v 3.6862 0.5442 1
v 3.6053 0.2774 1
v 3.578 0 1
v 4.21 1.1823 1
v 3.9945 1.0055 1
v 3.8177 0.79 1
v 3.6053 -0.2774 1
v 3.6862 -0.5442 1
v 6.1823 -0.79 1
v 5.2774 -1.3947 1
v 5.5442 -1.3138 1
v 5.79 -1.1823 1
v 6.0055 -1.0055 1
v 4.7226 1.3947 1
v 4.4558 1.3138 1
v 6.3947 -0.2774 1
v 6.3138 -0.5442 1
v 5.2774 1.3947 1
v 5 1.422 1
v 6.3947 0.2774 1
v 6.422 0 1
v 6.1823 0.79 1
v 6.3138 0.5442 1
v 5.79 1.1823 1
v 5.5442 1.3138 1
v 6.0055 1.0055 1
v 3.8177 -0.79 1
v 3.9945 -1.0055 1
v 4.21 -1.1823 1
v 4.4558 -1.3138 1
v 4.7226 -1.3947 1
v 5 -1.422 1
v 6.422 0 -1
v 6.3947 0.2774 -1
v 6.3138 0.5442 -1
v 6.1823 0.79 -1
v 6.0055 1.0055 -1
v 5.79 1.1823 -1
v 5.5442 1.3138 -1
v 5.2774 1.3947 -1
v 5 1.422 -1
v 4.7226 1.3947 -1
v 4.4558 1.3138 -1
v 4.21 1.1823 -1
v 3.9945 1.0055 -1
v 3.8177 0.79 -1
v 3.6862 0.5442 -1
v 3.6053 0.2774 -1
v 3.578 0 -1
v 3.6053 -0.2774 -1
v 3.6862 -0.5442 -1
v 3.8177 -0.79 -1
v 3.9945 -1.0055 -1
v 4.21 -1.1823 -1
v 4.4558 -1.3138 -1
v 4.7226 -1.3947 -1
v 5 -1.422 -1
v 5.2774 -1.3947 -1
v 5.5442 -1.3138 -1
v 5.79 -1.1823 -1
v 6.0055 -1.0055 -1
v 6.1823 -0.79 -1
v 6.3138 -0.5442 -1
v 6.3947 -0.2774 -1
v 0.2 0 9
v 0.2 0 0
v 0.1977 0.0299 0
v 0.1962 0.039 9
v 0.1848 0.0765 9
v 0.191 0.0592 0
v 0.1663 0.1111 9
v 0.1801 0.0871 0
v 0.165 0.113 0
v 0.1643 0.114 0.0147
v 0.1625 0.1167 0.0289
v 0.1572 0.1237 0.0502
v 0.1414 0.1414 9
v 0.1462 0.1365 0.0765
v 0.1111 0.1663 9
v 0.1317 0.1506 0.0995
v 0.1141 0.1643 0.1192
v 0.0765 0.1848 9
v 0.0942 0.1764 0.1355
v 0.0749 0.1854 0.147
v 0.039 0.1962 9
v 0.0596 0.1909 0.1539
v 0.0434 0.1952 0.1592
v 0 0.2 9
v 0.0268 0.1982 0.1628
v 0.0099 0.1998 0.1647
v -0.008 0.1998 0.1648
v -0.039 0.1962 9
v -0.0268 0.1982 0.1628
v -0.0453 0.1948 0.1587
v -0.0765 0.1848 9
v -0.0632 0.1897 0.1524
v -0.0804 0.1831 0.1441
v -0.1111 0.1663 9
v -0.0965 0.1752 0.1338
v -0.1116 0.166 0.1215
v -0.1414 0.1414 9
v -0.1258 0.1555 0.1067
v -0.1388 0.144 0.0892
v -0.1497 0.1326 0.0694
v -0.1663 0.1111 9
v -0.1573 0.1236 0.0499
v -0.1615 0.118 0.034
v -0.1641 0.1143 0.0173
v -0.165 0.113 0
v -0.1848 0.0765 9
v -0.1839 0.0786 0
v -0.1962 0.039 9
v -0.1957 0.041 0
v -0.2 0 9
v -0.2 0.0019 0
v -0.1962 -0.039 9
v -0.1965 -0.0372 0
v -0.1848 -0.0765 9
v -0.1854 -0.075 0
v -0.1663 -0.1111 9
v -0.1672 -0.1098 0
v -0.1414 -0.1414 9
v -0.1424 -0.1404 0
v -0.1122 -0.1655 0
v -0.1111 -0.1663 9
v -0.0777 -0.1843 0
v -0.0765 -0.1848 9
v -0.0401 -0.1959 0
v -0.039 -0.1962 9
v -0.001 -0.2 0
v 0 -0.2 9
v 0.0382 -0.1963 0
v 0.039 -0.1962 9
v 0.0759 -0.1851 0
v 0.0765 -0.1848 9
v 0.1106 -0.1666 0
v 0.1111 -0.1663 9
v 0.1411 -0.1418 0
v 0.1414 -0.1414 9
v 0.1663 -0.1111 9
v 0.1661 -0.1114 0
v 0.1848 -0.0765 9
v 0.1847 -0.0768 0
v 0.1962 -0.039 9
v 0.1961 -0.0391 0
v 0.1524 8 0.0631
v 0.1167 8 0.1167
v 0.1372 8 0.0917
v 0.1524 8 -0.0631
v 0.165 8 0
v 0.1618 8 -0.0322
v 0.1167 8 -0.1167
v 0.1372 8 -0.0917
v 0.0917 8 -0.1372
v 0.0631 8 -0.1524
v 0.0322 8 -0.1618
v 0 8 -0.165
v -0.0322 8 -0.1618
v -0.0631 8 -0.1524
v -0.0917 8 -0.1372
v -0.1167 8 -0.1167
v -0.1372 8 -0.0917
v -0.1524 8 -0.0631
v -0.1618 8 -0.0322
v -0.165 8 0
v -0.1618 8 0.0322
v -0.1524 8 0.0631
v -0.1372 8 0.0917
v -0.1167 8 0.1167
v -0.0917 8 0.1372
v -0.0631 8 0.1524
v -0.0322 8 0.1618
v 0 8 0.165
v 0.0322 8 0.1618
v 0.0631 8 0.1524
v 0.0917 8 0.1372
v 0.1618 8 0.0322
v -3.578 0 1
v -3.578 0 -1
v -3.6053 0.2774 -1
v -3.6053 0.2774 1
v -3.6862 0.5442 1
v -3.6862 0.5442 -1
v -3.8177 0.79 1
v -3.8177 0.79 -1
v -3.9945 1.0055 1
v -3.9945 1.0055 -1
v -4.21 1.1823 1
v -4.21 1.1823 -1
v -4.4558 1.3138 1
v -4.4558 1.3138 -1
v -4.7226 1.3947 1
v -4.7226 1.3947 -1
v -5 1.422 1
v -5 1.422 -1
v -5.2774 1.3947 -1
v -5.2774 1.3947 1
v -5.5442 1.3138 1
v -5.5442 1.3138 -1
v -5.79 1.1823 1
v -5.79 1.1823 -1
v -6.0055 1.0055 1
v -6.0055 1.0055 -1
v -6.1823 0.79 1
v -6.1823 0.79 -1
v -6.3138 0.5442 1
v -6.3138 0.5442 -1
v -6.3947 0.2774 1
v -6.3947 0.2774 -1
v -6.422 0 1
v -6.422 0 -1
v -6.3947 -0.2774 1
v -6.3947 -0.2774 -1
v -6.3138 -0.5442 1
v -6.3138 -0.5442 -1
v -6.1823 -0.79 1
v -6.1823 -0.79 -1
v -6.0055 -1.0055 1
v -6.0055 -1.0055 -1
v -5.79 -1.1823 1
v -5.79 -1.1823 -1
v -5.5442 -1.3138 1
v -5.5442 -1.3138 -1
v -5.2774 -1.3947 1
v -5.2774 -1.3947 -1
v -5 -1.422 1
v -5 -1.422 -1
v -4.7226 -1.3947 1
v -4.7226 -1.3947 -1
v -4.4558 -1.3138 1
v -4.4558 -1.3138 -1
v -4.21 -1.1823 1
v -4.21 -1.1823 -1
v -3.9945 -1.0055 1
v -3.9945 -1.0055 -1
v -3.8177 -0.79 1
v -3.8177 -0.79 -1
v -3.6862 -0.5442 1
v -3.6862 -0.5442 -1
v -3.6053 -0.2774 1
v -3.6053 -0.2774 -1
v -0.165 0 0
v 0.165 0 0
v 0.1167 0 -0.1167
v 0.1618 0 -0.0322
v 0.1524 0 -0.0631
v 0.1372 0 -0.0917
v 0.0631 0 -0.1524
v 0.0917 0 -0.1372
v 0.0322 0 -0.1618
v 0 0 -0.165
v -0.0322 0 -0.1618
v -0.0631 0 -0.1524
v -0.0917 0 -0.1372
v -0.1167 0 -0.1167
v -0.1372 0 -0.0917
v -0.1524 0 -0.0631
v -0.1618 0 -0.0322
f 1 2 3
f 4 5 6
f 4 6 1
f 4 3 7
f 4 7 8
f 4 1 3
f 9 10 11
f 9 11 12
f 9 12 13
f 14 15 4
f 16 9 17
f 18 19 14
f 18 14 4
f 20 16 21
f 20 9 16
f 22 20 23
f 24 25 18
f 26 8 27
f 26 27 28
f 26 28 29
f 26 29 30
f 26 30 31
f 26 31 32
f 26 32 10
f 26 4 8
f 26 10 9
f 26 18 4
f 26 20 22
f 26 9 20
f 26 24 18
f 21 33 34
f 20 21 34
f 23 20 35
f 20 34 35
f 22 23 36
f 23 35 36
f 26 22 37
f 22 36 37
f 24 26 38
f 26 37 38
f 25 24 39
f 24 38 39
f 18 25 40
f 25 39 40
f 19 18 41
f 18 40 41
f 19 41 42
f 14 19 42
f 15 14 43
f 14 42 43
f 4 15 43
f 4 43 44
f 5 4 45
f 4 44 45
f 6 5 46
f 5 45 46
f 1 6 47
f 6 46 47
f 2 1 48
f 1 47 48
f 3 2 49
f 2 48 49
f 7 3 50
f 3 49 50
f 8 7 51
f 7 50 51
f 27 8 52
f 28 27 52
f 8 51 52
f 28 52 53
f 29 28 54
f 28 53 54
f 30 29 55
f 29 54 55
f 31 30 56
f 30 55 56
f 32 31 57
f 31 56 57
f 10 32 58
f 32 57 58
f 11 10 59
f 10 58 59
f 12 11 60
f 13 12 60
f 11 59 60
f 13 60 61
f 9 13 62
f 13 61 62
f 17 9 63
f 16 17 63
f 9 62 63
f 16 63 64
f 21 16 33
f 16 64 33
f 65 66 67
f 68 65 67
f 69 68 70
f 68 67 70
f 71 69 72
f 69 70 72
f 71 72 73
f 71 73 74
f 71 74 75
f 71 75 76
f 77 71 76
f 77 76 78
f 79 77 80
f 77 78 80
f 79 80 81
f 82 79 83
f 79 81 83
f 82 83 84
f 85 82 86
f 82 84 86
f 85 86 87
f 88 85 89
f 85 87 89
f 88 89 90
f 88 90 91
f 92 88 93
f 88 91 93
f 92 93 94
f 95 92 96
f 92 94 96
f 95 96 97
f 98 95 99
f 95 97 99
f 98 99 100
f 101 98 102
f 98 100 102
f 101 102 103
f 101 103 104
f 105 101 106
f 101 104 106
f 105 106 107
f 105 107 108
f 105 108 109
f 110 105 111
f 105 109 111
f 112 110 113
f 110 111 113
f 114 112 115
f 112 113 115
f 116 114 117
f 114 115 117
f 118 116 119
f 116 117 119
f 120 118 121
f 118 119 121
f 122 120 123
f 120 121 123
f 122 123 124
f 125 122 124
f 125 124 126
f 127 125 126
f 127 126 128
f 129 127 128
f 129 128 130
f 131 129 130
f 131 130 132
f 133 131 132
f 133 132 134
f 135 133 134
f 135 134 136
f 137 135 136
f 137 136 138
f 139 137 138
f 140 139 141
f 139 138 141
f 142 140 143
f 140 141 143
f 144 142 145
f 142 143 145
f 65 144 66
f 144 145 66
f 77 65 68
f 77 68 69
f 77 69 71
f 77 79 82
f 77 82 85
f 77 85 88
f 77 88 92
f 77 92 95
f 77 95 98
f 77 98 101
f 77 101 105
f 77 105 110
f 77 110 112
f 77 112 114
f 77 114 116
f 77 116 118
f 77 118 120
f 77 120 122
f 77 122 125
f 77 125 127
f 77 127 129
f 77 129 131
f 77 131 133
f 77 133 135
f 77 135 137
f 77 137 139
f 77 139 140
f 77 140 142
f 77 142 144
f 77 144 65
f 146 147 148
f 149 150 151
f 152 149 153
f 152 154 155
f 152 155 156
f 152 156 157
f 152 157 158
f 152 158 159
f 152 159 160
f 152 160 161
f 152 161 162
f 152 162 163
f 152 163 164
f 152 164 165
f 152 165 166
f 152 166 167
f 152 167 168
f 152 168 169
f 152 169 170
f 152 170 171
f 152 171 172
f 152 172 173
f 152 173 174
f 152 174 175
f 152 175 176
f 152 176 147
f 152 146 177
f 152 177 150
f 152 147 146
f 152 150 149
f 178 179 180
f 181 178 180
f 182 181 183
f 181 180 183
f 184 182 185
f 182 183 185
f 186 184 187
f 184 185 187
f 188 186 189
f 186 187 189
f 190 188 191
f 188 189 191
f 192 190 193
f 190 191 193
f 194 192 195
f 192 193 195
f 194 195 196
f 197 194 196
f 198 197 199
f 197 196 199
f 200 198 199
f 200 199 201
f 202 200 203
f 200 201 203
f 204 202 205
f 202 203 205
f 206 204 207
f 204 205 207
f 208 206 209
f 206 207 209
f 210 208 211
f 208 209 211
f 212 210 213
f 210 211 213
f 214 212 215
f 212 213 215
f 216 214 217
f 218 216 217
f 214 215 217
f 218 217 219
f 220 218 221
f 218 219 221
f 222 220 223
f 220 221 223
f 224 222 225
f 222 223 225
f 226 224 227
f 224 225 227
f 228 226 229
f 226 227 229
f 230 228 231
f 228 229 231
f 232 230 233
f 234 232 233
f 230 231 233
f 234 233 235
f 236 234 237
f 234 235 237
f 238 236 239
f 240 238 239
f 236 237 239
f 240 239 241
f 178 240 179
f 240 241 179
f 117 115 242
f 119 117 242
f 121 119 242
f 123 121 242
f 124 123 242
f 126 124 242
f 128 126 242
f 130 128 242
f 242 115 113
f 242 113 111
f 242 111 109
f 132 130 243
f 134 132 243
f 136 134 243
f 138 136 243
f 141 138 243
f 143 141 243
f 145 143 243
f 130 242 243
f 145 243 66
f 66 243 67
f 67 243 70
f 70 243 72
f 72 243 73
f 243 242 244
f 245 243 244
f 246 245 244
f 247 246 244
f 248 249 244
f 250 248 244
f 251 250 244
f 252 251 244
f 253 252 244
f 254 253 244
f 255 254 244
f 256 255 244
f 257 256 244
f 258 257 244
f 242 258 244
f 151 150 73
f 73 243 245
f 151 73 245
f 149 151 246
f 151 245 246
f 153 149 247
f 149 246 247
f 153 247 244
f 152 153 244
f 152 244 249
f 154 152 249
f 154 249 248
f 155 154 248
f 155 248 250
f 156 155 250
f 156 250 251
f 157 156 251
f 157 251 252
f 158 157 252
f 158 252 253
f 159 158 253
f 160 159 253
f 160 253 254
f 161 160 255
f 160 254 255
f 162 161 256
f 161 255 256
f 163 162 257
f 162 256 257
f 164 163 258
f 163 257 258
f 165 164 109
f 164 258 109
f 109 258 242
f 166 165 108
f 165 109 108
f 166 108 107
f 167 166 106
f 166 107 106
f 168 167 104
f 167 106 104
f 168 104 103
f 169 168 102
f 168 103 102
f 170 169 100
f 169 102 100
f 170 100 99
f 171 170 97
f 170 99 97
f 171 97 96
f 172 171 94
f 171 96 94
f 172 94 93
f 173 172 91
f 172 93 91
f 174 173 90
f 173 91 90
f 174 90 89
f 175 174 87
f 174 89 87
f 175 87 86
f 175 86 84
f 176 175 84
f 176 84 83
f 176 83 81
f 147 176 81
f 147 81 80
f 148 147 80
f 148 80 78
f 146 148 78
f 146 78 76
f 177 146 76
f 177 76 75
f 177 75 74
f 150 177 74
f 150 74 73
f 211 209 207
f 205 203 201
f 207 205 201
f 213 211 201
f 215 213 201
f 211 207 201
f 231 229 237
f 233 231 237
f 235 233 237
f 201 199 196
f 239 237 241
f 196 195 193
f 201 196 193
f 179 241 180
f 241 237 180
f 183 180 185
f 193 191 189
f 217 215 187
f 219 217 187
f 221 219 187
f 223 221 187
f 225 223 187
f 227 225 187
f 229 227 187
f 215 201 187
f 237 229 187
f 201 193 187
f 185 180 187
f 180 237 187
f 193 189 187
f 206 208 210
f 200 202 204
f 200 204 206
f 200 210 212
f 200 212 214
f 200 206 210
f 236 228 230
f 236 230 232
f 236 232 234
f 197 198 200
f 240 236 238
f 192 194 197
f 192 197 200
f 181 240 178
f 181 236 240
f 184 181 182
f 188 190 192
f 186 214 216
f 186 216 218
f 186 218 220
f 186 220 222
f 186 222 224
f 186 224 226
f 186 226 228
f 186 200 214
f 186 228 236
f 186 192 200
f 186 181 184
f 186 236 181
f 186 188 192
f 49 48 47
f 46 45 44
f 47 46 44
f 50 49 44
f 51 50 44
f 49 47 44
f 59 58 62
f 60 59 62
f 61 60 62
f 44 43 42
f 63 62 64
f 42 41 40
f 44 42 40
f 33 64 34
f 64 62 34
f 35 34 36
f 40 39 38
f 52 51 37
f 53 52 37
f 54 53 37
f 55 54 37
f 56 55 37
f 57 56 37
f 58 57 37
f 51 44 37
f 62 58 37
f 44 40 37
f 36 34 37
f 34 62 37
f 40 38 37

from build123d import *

# Parameters (mm, degrees)
CYLINDER136_R     = 0.2
CYLINDER136_DEPTH = 9
CYLINDER_R        = 1.422
CYLINDER_DEPTH    = 2
CYLINDER139_R     = 1.422
CYLINDER139_DEPTH = 2
CYLINDER138_R     = 0.165
CYLINDER138_DEPTH = 8


with BuildPart() as bowtienozzle:
    # Cylinder136 → Cylinder136 (new body)
    with BuildSketch(Plane.XY):
        Circle(CYLINDER136_R)
    extrude(amount=CYLINDER136_DEPTH)


with BuildPart() as mountinghole1:
    # Cylinder → Cylinder (new body)
    with BuildSketch(Plane(origin=(-5, 0, -1), x_dir=(1, 0, 0), z_dir=(0, 0, 1))):
        Circle(CYLINDER_R)
    extrude(amount=CYLINDER_DEPTH)


with BuildPart() as mountinghole2:
    # Cylinder139 → Cylinder139 (new body)
    with BuildSketch(Plane(origin=(5, 0, -1), x_dir=(1, 0, 0), z_dir=(0, 0, 1))):
        Circle(CYLINDER139_R)
    extrude(amount=CYLINDER139_DEPTH)


with BuildPart() as fusion001:
    # Cylinder138 → Cylinder138 (new body)
    with BuildSketch(Plane(origin=(0, 0, 0), x_dir=(1, 0, 0), z_dir=(0, 1, 0))):
        Circle(CYLINDER138_R)
    extrude(amount=CYLINDER138_DEPTH)

    # Fusion001: union BowTieNozzle, MountingHole1, MountingHole2
    add(bowtienozzle.part)
    add(mountinghole1.part)
    add(mountinghole2.part)


solid = fusion001.part
